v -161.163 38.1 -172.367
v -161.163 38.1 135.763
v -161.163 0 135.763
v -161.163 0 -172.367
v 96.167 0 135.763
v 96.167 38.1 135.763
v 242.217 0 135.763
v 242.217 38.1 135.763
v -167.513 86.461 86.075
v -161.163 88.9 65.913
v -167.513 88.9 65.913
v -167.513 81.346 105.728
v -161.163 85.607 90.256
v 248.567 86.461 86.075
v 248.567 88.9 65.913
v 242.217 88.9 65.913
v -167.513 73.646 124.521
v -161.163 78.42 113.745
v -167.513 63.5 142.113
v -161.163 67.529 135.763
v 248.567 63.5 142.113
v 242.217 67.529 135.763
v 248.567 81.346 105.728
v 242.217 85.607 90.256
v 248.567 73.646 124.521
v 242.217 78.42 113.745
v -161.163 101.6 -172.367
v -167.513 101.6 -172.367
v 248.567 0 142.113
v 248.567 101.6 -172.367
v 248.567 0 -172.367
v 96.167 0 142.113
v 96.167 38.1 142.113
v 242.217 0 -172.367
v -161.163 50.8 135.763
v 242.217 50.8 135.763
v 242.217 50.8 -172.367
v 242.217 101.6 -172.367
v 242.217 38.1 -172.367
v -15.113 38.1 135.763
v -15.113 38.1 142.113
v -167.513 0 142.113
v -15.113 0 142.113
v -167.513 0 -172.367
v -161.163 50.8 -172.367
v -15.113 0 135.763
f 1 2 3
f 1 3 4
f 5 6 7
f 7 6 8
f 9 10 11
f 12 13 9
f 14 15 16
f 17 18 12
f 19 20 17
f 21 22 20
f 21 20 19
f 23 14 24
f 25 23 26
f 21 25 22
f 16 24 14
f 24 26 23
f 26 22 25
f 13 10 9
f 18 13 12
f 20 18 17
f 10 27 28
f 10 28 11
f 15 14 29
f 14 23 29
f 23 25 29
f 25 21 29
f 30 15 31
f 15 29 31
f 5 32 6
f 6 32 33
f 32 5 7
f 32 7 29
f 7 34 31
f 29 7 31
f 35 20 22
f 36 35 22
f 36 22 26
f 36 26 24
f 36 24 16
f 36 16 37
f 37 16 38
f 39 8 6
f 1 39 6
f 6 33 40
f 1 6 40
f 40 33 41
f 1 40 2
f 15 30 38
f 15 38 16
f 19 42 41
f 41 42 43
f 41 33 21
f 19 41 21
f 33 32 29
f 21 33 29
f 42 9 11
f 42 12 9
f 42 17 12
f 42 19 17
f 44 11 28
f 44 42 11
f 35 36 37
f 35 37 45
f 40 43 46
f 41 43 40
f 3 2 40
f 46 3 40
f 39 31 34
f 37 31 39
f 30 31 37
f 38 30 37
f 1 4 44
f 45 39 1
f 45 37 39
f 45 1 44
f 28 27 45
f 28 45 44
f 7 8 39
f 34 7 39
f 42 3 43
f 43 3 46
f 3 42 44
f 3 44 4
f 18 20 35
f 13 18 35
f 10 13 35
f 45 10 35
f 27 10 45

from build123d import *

# Parameters (mm, degrees)
SKETCH1_W           = 416.08
SKETCH1_H           = 314.48
BOSS_EXTRUDE2_DEPTH = 101.6
SKETCH2_W           = 403.38
SKETCH2_H           = 308.13
CUT_EXTRUDE1_DEPTH  = 320.090106675
CUT_EXTRUDE2_DEPTH  = 462.687674829
CUT_EXTRUDE3_REACH  = 415.528
SKETCH4_W           = 111.28
SKETCH4_H           = 38.1
SKETCH5_W           = 403.38
SKETCH5_H           = 12.7
BOSS_EXTRUDE3_DEPTH = 308.13


with BuildPart() as part:
    # Sketch1 → Boss-Extrude2 (new body)
    with BuildSketch(Plane(origin=(0, 0, 0), x_dir=(1, 0, 0), z_dir=(0, 1, 0))):
        with Locations((40.527, 15.127)):
            Rectangle(SKETCH1_W, SKETCH1_H)
    extrude(amount=BOSS_EXTRUDE2_DEPTH)

    # Sketch2 → Cut-Extrude1 (cut, through all)
    with BuildSketch(Plane(origin=(0, 101.6, 0), x_dir=(1, 0, 0), z_dir=(0, 1, 0))):
        with Locations((40.527, 18.302)):
            Rectangle(SKETCH2_W, SKETCH2_H)
    extrude(amount=-CUT_EXTRUDE1_DEPTH, mode=Mode.SUBTRACT)

    # Sketch3 → Cut-Extrude2 (cut, through all)
    with BuildSketch(Plane(origin=(248.567, 0, 0), x_dir=(0, 0, -1), z_dir=(1, 0, 0))):
        with BuildLine():
            Line((-142.113, 63.5), (-142.113, 101.6))
            Line((-142.113, 101.6), (172.367, 101.6))
            Line((172.367, 101.6), (-65.913, 88.9))
            ThreePointArc((-65.913, 88.9), (-105.728307199, 81.345921598), (-142.113, 63.5))
        make_face()
    extrude(amount=-CUT_EXTRUDE2_DEPTH, mode=Mode.SUBTRACT)

    # Sketch4 → Cut-Extrude3 (cut, up to next)
    with BuildSketch(Plane.XY.offset(142.113), mode=Mode.PRIVATE) as cut_extrude3_sk1:
        with Locations((40.527, 19.05)):
            Rectangle(SKETCH4_W, SKETCH4_H)
    cut_extrude3_tool1 = extrude(cut_extrude3_sk1.sketch, amount=-CUT_EXTRUDE3_REACH, mode=Mode.PRIVATE) & part.part
    add(cut_extrude3_tool1.solids().sort_by_distance((40.527, 19.05, 142.113))[0], mode=Mode.SUBTRACT)

    # Sketch5 → Boss-Extrude3 (add)
    with BuildSketch(Plane(origin=(0, 0, 135.763), x_dir=(-1, 0, 0), z_dir=(0, 0, -1))):
        with Locations((-40.527, 44.45)):
            Rectangle(SKETCH5_W, SKETCH5_H)
    extrude(amount=BOSS_EXTRUDE3_DEPTH)


solid = part.part
